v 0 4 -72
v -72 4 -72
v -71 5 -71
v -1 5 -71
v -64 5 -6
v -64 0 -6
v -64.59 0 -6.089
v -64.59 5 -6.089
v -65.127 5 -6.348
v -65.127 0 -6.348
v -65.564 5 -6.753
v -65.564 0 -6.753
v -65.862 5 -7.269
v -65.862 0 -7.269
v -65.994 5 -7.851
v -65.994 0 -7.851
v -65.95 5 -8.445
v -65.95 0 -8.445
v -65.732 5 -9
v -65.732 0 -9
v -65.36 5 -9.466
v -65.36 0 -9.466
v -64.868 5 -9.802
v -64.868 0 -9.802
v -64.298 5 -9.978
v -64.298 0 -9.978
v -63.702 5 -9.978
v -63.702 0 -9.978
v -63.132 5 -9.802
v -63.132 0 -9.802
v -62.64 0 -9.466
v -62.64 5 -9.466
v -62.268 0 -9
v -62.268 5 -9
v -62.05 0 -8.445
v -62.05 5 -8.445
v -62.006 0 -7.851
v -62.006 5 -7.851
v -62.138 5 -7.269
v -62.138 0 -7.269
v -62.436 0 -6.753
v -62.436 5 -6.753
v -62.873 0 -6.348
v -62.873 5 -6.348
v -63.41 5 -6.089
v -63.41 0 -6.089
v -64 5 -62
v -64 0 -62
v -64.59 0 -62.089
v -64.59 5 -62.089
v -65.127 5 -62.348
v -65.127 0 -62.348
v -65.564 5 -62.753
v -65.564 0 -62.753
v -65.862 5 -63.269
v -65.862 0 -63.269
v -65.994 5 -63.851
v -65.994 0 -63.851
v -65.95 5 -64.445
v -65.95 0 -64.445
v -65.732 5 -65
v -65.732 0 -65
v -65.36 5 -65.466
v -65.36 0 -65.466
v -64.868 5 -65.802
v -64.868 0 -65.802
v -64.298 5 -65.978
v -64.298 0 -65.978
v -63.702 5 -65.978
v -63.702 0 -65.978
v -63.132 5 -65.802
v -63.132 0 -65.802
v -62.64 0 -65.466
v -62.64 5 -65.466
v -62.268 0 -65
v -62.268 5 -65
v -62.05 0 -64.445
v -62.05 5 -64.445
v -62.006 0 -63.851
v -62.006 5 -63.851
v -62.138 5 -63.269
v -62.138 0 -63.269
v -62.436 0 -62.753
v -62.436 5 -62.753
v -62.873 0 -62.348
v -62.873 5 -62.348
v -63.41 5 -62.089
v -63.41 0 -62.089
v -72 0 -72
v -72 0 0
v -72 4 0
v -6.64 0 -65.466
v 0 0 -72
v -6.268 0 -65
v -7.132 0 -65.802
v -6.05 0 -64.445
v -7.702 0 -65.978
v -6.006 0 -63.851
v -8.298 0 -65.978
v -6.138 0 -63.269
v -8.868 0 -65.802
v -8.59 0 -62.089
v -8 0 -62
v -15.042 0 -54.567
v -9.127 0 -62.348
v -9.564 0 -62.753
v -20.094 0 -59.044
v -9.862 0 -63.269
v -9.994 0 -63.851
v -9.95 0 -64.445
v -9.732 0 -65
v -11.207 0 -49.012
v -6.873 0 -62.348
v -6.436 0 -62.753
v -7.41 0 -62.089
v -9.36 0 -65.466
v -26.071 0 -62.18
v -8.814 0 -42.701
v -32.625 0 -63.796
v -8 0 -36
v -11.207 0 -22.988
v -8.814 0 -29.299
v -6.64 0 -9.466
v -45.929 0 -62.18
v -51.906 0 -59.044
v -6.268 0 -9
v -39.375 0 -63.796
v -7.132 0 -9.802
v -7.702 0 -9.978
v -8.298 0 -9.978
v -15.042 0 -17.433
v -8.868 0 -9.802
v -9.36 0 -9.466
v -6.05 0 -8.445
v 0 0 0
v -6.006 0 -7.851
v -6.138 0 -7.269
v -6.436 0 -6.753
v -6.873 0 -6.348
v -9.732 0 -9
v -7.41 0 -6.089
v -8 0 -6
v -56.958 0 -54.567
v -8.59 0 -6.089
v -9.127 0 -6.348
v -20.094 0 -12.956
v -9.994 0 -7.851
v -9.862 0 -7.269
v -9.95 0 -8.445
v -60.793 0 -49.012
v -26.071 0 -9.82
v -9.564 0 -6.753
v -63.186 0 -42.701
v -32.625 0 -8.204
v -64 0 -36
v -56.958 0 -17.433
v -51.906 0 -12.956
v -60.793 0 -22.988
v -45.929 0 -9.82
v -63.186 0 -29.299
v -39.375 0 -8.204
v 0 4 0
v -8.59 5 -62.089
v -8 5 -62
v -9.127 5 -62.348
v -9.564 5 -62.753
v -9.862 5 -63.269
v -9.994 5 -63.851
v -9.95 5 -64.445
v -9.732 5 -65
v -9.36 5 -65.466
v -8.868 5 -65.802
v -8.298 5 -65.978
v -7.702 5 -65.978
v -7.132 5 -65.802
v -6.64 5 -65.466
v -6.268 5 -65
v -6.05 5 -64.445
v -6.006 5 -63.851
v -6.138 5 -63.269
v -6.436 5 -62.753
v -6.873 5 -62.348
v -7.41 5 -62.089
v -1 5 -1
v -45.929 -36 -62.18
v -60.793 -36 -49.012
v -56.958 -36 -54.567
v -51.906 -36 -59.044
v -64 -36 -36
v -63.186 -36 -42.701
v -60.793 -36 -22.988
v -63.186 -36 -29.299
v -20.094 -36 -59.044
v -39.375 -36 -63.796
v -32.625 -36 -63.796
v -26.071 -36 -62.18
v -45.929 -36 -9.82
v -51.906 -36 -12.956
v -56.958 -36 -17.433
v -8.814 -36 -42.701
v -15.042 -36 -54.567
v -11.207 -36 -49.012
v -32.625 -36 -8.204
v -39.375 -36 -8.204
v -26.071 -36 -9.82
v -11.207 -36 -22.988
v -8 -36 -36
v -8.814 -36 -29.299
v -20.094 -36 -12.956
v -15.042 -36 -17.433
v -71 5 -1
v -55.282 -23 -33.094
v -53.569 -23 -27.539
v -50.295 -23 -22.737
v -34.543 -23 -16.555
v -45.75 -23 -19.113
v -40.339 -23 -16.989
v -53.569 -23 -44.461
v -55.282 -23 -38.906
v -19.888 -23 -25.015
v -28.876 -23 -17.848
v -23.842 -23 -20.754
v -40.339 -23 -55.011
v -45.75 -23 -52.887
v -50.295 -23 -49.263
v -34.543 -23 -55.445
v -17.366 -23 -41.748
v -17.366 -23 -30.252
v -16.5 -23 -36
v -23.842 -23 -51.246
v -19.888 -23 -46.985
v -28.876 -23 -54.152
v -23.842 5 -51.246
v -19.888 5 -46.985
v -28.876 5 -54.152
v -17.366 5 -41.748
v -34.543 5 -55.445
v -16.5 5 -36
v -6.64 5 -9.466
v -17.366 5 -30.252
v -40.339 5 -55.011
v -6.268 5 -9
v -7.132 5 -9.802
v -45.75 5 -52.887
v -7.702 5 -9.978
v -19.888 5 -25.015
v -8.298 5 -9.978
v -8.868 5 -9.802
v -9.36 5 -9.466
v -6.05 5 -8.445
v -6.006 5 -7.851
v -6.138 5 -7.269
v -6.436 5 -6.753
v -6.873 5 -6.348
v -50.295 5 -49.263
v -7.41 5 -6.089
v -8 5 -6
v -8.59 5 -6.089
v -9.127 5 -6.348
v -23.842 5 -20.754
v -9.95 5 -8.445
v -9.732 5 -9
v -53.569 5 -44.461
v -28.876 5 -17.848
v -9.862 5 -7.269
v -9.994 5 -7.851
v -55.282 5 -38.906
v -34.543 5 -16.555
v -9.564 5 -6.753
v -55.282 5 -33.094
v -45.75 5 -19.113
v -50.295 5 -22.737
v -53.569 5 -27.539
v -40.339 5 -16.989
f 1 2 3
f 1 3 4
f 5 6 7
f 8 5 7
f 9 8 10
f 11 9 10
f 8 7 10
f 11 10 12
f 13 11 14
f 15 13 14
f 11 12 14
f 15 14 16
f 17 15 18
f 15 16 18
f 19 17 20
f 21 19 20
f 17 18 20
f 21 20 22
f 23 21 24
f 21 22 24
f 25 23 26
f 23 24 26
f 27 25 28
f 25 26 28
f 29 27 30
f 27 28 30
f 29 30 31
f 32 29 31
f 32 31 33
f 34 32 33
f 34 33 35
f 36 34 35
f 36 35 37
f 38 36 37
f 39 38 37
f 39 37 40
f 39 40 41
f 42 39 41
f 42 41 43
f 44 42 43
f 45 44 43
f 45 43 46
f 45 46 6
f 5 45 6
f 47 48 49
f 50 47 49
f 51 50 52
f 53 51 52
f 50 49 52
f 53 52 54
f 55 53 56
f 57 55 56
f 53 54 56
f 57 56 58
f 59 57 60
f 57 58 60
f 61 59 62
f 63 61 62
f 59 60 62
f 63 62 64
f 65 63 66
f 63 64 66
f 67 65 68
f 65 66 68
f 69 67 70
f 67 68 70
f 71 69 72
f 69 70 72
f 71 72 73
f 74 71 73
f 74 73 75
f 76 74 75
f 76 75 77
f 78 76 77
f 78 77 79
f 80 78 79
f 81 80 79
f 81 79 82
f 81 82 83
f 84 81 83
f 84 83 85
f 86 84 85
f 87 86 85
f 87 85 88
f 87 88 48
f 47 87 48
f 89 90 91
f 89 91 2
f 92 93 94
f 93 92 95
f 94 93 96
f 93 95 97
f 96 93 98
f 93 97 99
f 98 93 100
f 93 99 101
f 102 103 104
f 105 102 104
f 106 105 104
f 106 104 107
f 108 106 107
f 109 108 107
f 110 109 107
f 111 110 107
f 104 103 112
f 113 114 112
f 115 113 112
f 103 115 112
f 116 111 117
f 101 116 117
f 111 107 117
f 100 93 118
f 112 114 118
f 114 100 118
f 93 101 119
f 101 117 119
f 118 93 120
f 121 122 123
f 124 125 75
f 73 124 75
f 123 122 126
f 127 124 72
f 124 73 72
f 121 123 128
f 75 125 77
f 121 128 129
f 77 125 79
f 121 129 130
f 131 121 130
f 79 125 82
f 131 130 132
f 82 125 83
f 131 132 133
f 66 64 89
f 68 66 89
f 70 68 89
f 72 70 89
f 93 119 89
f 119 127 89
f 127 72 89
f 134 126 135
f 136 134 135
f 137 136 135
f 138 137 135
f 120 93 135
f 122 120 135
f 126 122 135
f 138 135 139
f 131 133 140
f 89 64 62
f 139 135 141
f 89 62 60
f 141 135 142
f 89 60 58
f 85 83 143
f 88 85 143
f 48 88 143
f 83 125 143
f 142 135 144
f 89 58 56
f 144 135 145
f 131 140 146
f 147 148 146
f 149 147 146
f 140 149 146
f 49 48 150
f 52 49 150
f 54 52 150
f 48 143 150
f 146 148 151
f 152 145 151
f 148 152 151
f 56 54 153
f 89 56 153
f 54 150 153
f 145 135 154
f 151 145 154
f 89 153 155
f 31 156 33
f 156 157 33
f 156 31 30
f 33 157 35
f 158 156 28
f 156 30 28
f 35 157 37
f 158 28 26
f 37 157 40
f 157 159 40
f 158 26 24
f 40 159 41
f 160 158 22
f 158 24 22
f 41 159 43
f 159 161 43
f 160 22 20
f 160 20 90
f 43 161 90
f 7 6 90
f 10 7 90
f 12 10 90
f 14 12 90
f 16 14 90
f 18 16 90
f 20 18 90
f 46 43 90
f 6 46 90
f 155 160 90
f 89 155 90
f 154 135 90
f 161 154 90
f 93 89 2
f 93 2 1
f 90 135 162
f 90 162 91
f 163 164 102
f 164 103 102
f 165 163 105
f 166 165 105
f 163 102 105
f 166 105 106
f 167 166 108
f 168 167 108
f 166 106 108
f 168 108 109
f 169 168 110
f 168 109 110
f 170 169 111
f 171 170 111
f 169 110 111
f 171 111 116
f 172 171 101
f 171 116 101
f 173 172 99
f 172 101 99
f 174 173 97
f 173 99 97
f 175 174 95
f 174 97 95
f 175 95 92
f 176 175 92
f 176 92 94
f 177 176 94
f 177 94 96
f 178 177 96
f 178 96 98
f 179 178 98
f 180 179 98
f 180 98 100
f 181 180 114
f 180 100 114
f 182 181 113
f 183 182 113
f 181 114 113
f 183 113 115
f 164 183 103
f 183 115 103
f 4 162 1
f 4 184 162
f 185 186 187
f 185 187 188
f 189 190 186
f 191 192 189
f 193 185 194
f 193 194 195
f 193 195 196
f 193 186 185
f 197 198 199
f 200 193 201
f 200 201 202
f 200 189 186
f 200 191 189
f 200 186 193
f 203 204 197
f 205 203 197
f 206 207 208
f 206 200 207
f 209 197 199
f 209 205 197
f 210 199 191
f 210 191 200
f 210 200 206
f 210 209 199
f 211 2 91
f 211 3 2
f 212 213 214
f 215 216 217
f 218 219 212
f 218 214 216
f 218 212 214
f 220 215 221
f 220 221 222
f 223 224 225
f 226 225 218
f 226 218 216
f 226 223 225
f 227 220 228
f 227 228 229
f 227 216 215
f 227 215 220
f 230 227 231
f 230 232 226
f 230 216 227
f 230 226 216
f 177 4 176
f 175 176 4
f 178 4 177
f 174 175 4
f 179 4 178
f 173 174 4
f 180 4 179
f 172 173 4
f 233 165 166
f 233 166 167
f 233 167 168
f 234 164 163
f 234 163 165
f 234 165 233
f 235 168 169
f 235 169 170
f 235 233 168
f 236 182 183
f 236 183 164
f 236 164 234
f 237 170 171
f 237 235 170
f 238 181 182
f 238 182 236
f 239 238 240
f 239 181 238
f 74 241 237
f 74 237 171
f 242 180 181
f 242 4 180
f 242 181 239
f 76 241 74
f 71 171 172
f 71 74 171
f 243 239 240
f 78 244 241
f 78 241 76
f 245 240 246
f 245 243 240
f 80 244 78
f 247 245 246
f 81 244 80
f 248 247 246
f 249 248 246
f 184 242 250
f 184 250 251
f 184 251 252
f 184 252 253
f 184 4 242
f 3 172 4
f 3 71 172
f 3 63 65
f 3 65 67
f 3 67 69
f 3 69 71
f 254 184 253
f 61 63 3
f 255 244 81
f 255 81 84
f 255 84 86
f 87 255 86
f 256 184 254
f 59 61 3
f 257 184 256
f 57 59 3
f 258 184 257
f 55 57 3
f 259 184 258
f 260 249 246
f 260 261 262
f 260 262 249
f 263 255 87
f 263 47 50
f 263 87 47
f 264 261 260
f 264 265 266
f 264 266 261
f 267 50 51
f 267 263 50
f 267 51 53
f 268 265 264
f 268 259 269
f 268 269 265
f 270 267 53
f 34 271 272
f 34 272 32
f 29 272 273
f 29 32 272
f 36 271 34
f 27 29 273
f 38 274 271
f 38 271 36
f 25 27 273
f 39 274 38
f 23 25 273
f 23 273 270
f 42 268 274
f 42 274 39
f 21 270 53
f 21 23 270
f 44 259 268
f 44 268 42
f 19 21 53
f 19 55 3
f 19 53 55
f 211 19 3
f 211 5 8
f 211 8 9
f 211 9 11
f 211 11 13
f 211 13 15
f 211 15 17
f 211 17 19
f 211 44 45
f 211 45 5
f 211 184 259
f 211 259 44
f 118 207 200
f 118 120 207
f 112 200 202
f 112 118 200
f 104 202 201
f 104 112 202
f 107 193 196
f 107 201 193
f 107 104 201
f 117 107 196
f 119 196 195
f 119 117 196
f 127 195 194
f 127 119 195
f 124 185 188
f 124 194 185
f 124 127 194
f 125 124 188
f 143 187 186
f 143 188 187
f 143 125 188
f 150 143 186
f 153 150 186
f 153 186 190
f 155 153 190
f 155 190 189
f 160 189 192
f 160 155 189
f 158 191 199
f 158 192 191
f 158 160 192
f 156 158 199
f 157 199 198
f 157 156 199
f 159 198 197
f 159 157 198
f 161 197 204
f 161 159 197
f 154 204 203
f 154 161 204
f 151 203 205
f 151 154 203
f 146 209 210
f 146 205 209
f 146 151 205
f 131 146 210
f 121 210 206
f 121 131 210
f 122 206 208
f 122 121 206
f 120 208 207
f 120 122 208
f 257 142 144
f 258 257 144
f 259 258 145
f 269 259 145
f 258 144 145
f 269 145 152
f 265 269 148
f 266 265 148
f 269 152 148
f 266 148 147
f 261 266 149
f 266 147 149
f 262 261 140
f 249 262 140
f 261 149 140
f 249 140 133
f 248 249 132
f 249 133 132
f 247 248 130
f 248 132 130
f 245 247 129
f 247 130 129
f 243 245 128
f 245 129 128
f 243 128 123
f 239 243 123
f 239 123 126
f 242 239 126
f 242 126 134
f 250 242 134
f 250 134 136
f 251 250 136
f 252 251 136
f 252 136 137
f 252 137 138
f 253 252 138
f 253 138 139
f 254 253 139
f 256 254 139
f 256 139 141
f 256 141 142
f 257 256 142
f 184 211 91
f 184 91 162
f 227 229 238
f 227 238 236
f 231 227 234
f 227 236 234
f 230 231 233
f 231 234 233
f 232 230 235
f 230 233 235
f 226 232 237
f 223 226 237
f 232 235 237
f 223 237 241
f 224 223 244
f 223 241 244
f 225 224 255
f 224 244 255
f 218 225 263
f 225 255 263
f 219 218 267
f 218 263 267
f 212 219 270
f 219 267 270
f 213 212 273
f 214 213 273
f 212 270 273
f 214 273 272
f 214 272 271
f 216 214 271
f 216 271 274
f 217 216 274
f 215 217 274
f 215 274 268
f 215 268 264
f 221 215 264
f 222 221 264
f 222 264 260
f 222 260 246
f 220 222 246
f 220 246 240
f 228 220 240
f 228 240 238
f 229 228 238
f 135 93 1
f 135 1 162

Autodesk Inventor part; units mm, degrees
ref_plane "YZ Plane" through (0, 0, 0) normal (1, 0, 0) x (0, 1, 0)
ref_plane "XZ Plane" through (0, 0, 0) normal (0, 1, 0) x (-1, 0, 0)
ref_plane "XY Plane" through (0, 0, 0) normal (0, 0, 1) x (1, 0, 0)
sketch "Skizze1" plane through (0, 0, 0) normal (0, 1, 0) x (-1, 0, 0)
  line L0 (0, 0) -> (72, 0)
  line L1 (72, 0) -> (72, -72)
  line L2 (72, -72) -> (0, -72)
  line L3 (0, -72) -> (0, 0)
  dimension "d6" = 72
  dimension "STECKDOSE" = 72
extrude "Extrusion1" add sketch "Skizze1" along normal blind 5
sketch "Skizze2" plane through (0, 5, 0) normal (0, 1, 0) x (1, 0, 0)
  line L0 (-72, 72) -> (-72, 0) projected
  line L1 (0, 0) -> (0, 72) projected
  line L2 (-72, 0) -> (0, 0) projected
  point P0 (-8, 8)
  dimension "d23" = 8
  dimension "d24" = 8
hole "Bohrung1" at (-8, 5, -8) direction (0, -1, 0) diameter 4 end through all
pattern_linear "Rechteckige Anordnung1" count 2 spacing 56 along (-1, 0, 0) count 2 spacing 56 along (0, 0, -1) of "Bohrung1"
chamfer "Fasen1" distance 1 angle 45 4 edges at (-36, 5, 0) (-72, 5, -36) (-36, 5, -72) (0, 5, -36)
sketch "Skizze3" plane through (0, 0, 0) normal (0, -1, 0) x (1, 0, 0)
  circle A0 centre (-36, -36) radius 28
  line L0 (-72, 0) -> (0, 0) projected
  line L1 (-72, -72) -> (-72, 0) projected
  point P0 (-36, 0)
  point P1 (-72, -36)
  dimension "d28" = 56
extrude "Extrusion2" add sketch "Skizze3" along normal blind 36
sketch "Skizze4" plane through (0, 5, 0) normal (0, 1, 0) x (1, 0, 0)
  circle A0 centre (-36, 36) radius 19.5
  line L0 (0, 72) -> (-72, 72) projected
  line L1 (0, 0) -> (0, 72) projected
  point P0 (-36, 72)
  point P1 (0, 36)
  dimension "d31" = 39
extrude "Extrusion3" cut sketch "Skizze4" against normal blind 28
equation "\"d6\" = STECKDOSE"
properties part number "Steckdose" material "PC/ABS-Kunststoff"
